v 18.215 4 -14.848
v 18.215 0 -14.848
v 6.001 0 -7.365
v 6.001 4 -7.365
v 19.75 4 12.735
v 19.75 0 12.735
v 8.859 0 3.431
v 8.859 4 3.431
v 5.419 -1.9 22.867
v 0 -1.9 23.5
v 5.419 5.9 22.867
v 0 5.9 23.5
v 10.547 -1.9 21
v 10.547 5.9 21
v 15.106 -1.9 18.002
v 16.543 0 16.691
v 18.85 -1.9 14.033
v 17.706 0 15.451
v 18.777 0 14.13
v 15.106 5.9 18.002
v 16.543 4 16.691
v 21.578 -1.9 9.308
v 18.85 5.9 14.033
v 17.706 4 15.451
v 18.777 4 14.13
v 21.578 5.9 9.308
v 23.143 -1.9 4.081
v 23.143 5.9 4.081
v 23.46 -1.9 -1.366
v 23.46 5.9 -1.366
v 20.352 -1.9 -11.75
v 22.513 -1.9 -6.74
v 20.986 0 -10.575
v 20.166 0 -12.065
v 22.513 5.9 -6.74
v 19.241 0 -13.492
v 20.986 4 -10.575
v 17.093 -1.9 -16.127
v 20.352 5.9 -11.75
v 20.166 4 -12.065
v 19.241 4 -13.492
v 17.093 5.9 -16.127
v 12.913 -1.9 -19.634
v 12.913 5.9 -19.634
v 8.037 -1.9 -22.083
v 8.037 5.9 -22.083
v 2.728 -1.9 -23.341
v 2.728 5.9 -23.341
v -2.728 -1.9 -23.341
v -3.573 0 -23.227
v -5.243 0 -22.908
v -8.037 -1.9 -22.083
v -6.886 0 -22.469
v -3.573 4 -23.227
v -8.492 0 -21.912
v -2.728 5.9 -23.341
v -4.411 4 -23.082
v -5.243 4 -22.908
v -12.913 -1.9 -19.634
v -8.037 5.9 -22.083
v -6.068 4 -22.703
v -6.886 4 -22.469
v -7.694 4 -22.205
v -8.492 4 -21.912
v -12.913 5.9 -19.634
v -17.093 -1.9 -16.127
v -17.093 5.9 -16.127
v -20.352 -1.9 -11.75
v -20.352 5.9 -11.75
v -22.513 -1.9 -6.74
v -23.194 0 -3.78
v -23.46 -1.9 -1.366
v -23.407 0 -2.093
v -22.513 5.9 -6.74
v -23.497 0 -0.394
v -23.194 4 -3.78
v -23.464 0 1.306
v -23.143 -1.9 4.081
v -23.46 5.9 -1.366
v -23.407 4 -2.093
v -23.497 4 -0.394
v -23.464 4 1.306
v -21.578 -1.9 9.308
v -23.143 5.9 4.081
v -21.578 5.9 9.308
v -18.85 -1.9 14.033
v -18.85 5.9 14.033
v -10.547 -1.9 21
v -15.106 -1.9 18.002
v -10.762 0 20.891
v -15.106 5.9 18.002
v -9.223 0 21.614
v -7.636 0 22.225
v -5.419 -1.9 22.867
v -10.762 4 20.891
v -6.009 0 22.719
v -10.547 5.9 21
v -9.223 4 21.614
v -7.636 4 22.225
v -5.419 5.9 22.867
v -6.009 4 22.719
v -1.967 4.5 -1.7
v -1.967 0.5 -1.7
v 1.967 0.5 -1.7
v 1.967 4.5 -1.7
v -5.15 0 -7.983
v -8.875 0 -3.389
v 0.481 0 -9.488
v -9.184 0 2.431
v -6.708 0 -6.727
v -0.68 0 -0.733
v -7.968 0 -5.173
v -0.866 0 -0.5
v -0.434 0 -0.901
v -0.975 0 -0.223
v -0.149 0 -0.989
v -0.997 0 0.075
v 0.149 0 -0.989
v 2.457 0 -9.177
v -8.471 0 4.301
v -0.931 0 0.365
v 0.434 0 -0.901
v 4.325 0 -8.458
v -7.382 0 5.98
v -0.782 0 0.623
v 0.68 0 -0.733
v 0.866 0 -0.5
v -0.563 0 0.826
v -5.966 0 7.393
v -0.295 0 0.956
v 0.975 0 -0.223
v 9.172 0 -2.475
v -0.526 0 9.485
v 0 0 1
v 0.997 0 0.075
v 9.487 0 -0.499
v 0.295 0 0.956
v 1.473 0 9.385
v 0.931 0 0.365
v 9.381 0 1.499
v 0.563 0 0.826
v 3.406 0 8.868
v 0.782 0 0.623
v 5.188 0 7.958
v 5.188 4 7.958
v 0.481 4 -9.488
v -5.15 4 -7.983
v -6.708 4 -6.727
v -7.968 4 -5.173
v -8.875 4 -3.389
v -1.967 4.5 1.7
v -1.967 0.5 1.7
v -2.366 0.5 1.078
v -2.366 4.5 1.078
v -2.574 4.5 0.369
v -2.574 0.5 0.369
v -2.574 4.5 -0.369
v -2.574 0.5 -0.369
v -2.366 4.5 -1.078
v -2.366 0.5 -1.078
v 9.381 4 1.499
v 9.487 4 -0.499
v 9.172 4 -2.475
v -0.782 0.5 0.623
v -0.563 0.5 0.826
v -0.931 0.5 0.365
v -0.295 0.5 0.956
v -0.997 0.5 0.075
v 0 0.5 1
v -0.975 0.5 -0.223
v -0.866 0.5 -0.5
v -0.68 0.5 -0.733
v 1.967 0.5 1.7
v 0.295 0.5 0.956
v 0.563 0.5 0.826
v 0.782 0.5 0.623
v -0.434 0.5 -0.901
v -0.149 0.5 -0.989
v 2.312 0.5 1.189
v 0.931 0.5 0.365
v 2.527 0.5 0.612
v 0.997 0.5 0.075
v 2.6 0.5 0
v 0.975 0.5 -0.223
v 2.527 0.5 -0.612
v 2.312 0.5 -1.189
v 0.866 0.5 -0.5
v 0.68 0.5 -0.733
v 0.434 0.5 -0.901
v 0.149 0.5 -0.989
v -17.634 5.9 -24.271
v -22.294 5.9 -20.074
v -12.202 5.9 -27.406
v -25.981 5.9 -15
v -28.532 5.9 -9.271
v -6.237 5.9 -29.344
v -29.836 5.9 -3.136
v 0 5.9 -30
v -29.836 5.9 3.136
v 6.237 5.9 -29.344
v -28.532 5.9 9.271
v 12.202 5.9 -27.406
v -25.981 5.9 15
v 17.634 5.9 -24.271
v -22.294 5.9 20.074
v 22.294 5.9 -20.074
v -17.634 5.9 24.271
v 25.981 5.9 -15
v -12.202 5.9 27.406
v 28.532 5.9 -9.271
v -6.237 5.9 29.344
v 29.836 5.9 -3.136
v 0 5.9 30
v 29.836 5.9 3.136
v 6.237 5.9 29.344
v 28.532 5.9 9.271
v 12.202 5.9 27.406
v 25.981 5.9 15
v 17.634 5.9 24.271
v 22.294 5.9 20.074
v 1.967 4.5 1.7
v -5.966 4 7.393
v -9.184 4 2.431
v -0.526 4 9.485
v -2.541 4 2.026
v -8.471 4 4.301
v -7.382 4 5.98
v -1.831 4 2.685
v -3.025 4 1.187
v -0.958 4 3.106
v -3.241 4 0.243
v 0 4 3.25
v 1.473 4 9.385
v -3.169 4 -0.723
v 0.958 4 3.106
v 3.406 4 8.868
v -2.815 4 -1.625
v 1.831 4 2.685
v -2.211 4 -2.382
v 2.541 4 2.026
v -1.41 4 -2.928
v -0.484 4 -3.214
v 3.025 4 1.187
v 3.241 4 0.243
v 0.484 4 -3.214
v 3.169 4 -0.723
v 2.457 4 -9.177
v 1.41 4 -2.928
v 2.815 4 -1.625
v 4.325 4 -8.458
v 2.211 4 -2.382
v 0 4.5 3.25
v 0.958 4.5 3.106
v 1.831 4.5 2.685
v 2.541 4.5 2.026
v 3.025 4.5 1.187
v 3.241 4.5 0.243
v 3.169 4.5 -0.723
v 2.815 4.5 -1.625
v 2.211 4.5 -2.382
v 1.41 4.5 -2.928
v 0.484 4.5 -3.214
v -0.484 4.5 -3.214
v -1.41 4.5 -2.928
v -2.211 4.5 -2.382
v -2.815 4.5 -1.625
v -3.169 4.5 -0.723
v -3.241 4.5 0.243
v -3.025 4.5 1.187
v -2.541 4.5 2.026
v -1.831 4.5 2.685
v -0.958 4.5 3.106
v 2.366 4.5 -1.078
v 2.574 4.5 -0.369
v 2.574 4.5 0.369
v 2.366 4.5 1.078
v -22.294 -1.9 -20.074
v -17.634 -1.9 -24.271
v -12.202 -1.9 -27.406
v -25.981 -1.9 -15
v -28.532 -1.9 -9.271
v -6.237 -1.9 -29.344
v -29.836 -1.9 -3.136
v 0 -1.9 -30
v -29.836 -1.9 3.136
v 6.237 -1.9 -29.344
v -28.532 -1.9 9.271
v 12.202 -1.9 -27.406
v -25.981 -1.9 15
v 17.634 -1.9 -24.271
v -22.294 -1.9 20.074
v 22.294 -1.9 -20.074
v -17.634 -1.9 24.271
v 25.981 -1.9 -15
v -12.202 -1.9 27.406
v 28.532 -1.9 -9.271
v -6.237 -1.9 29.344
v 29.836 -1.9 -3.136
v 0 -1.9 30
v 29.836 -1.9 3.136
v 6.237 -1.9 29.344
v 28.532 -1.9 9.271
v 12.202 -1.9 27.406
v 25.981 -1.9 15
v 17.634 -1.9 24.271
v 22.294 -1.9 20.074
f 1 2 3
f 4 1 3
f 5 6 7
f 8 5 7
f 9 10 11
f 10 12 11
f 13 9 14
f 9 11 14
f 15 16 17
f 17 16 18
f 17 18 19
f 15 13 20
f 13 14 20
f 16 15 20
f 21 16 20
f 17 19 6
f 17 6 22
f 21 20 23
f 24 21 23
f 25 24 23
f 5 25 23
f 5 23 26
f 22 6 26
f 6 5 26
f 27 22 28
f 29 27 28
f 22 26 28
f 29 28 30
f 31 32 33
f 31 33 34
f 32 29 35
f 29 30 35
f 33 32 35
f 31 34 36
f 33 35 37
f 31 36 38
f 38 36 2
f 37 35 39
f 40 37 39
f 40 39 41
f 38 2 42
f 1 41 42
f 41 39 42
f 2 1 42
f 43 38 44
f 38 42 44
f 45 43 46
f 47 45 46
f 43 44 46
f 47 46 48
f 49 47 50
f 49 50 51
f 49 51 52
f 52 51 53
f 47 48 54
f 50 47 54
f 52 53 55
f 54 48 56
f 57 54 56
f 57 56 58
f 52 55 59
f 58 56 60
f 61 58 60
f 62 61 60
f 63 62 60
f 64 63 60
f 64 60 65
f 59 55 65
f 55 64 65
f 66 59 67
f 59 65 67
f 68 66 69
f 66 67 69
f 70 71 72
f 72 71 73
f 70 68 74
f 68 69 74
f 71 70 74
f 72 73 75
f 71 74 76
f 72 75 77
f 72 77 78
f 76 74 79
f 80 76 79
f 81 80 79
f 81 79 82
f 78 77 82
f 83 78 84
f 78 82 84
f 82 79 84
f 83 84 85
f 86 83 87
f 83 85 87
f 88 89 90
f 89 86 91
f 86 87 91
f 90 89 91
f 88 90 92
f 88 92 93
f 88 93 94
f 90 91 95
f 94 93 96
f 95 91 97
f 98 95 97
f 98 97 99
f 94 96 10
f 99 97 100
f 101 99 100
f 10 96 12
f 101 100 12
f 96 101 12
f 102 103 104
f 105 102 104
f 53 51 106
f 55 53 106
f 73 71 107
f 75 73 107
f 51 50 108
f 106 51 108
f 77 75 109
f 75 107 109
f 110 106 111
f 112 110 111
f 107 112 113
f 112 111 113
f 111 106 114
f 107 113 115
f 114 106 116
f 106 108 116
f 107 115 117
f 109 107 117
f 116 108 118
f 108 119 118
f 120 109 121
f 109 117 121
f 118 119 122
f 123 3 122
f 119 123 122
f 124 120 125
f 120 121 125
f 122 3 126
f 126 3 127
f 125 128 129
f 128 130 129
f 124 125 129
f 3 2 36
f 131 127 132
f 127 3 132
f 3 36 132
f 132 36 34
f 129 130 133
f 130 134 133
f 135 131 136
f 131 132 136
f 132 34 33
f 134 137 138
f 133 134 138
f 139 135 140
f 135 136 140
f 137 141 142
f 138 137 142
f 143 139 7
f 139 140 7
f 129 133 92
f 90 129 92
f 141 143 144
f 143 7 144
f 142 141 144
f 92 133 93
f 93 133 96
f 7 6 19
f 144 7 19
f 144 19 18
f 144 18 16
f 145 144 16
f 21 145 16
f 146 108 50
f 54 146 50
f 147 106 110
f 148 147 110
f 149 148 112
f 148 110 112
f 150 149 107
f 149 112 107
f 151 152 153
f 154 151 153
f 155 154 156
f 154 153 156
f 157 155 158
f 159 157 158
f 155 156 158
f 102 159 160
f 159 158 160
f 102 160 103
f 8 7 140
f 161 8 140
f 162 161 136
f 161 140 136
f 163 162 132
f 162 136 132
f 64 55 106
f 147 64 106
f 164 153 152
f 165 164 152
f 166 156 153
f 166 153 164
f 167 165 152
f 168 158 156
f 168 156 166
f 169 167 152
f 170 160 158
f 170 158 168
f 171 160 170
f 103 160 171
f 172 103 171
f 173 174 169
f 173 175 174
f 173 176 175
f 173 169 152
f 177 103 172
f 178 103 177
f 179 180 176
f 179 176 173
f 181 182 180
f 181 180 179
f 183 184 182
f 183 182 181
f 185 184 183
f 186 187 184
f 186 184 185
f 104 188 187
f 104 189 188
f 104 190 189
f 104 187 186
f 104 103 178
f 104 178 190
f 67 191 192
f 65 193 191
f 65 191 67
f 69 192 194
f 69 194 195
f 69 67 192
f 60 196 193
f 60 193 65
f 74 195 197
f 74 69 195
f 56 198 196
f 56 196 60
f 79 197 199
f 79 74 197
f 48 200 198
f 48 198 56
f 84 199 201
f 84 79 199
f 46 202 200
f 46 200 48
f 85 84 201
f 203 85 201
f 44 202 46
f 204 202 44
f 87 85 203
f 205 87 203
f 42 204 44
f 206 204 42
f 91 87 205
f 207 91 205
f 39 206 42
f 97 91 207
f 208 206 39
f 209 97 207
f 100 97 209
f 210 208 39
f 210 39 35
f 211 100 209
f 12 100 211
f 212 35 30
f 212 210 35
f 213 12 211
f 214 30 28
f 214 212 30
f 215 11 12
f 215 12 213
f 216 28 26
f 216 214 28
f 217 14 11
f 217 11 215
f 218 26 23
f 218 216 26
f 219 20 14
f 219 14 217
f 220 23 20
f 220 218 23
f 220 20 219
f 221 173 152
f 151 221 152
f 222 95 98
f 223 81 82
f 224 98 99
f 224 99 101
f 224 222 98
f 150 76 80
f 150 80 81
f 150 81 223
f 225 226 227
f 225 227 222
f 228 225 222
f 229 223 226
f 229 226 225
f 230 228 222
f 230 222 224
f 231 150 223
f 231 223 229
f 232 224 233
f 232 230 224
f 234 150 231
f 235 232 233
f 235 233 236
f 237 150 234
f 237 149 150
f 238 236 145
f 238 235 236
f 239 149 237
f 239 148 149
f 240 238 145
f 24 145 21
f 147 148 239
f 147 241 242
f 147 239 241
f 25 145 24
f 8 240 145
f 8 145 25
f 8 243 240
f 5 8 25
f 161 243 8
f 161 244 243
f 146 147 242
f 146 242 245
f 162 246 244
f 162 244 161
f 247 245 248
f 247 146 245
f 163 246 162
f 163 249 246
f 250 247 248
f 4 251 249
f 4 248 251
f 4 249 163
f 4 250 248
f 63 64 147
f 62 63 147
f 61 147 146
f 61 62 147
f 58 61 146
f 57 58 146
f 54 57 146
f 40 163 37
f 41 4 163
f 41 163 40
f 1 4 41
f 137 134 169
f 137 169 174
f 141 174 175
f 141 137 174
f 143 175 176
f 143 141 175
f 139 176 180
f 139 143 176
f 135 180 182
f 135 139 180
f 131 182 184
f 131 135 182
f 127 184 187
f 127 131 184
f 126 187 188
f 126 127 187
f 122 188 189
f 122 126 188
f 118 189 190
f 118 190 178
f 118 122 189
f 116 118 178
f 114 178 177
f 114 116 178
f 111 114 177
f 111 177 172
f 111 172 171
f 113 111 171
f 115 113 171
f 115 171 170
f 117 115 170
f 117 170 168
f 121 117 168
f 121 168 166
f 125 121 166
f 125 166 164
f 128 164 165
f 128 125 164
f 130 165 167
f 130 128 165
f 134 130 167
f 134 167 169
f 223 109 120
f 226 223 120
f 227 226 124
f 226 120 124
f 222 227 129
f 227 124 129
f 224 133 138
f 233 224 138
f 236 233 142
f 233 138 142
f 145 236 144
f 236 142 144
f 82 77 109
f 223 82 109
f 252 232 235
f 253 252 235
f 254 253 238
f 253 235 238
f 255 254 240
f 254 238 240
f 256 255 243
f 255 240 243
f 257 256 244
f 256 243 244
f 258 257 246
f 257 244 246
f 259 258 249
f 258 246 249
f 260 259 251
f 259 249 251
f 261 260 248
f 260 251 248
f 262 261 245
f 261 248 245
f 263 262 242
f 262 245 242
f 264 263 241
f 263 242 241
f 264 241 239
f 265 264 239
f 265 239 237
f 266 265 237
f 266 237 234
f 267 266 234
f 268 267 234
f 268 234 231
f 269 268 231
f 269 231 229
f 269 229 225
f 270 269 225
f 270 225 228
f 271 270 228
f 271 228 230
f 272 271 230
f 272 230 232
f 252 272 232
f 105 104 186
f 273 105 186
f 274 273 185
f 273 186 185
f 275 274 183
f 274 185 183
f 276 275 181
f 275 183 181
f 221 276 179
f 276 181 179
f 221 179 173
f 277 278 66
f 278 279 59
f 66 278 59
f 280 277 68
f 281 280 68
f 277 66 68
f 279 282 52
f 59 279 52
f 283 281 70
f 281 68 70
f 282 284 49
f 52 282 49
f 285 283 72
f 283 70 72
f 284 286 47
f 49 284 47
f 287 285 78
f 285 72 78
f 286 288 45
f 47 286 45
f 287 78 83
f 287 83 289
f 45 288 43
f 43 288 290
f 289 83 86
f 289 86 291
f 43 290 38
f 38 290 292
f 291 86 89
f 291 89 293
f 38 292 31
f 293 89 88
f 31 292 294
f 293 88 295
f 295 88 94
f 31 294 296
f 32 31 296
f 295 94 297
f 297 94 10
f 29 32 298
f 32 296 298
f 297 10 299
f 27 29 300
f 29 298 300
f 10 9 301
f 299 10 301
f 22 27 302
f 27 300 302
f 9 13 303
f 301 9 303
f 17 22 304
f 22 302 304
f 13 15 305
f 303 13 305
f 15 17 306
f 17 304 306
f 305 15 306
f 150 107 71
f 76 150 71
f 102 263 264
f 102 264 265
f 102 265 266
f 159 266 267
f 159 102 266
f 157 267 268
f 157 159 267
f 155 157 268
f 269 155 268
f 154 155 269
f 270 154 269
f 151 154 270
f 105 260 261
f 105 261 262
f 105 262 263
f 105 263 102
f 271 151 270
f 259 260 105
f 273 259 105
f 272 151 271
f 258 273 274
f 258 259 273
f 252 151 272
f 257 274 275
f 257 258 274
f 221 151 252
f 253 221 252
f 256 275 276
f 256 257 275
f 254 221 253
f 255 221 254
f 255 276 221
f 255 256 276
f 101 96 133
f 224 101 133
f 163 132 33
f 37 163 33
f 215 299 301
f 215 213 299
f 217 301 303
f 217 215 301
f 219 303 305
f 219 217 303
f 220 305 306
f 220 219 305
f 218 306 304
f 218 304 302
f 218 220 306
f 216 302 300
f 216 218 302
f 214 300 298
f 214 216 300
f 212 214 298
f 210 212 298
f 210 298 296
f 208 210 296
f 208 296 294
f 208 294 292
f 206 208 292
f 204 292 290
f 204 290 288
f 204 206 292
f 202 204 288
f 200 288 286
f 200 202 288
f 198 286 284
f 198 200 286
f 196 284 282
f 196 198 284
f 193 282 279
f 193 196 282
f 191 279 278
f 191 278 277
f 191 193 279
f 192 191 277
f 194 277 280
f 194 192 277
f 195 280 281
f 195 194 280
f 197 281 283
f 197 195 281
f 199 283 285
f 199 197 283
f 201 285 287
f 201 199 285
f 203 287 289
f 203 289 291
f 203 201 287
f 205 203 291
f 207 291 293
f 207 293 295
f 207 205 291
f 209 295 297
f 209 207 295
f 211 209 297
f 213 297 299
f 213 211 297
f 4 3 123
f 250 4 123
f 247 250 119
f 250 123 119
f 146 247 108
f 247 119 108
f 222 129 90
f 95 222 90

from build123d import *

# Parameters (mm, degrees)
SKETCH1_R                = 3.25
BOSS_EXTRUDE1_DEPTH      = 4
SKETCH1_4_R              = 3.25
BOSS_EXTRUDE2_DEPTH      = 4.5
SKETCH1_5_R              = 1
BOSS_EXTRUDE3_DEPTH      = 0.5
BOSS_EXTRUDE4_DEPTH      = 5.9
BOSS_EXTRUDE4_DEPTH_BACK = 1.9
SKETCH1_6_R              = 30


with BuildPart() as part:
    # Sketch1 → Boss-Extrude1 (new body)
    with BuildSketch(Plane(origin=(0, 0, 0), x_dir=(1, 0, 0), z_dir=(0, 1, 0))):
        with BuildLine():
            Line((-8.492467394, 21.911823237), (-5.150259407, 7.982783226))
            ThreePointArc((-5.150259407, 7.982783226), (-7.379213612, 5.983076673), (-8.874983612, 3.388903346))
            Line((-8.874983612, 3.388903346), (-23.194055647, 3.779653774))
            ThreePointArc((-23.194055647, 3.779653774), (-23.46703432, 1.244307122), (-23.463699022, -1.305690697))
            Line((-23.463699022, -1.305690697), (-9.183595688, -2.431372091))
            ThreePointArc((-9.183595688, -2.431372091), (-7.970546468, -5.16917682), (-5.965559371, -7.39338227))
            Line((-5.965559371, -7.39338227), (-10.762021714, -20.890880513))
            ThreePointArc((-10.762021714, -20.890880513), (-8.435118809, -21.933963861), (-6.008896103, -22.718784466))
            Line((-6.008896103, -22.718784466), (-0.525514867, -9.485453818))
            ThreePointArc((-0.525514867, -9.485453818), (2.453144985, -9.177803642), (5.188065158, -7.958264881))
            Line((5.188065158, -7.958264881), (16.54276044, -16.690927986))
            ThreePointArc((16.54276044, -16.690927986), (18.253844197, -14.800242296), (19.749996995, -12.735290287))
            Line((19.749996995, -12.735290287), (8.858809639, -3.430960767))
            ThreePointArc((8.858809639, -3.430960767), (9.486673449, -0.503017773), (9.171959975, 2.474904082))
            Line((9.171959975, 2.474904082), (20.986009934, 10.575319714))
            ThreePointArc((20.986009934, 10.575319714), (19.716614948, 12.78691108), (18.215065524, 14.847942212))
            Line((18.215065524, 14.847942212), (6.000560323, 7.365003449))
            ThreePointArc((6.000560323, 7.365003449), (3.409941646, 8.866921561), (0.48051785, 9.487839722))
            Line((0.48051785, 9.487839722), (-3.572693012, 23.226835011))
            ThreePointArc((-3.572693012, 23.226835011), (-6.068306016, 22.702987955), (-8.492467394, 21.911823237))
        make_face()
        Circle(SKETCH1_R, mode=Mode.SUBTRACT)
    extrude(amount=BOSS_EXTRUDE1_DEPTH)

    # Sketch1<4> → Boss-Extrude2 (add)
    with BuildSketch(Plane(origin=(0, 0, 0), x_dir=(1, 0, 0), z_dir=(0, 1, 0))):
        Circle(SKETCH1_4_R)
        with BuildLine():
            Line((-1.967231557, 1.7), (1.967231557, 1.7))
            ThreePointArc((1.967231557, 1.7), (2.6, 0), (1.967231557, -1.7))
            Line((1.967231557, -1.7), (-1.967231557, -1.7))
            ThreePointArc((-1.967231557, -1.7), (-2.6, 0), (-1.967231557, 1.7))
        make_face(mode=Mode.SUBTRACT)
    extrude(amount=BOSS_EXTRUDE2_DEPTH)

    # Sketch1<5> → Boss-Extrude3 (add)
    with BuildSketch(Plane(origin=(0, 0, 0), x_dir=(1, 0, 0), z_dir=(0, 1, 0))):
        with BuildLine():
            Line((1.967231557, 1.7), (-1.967231557, 1.7))
            ThreePointArc((-1.967231557, 1.7), (-2.6, 0), (-1.967231557, -1.7))
            Line((-1.967231557, -1.7), (1.967231557, -1.7))
            ThreePointArc((1.967231557, -1.7), (2.6, 0), (1.967231557, 1.7))
        make_face()
        Circle(SKETCH1_5_R, mode=Mode.SUBTRACT)
    extrude(amount=BOSS_EXTRUDE3_DEPTH)

    # Sketch1<6> → Boss-Extrude4 (add, two sides: drawn at the far end of the back side and taken through both)
    with BuildSketch(Plane(origin=(0, 0, 0), x_dir=(1, 0, 0), z_dir=(0, 1, 0)).offset(-BOSS_EXTRUDE4_DEPTH_BACK)):
        Circle(SKETCH1_6_R)
        with BuildLine():
            ThreePointArc((-8.492467394, 21.911823237), (-7.291125837, 22.340310741), (-6.068306016, 22.702987955))
            ThreePointArc((-6.068306016, 22.702987955), (-4.827610123, 22.998786501), (-3.572693012, 23.226835011))
            ThreePointArc((-3.572693012, 23.226835011), (8.435118809, 21.933963861), (18.215065524, 14.847942212))
            ThreePointArc((18.215065524, 14.847942212), (19.716614948, 12.78691108), (20.986009934, 10.575319714))
            ThreePointArc((20.986009934, 10.575319714), (22.862865453, 5.435014561), (23.5, 0))
            ThreePointArc((23.5, 0), (22.543013656, -6.637961683), (19.749996995, -12.735290287))
            ThreePointArc((19.749996995, -12.735290287), (18.253844197, -14.800242296), (16.54276044, -16.690927986))
            ThreePointArc((16.54276044, -16.690927986), (6.068306016, -22.702987955), (-6.008896103, -22.718784466))
            ThreePointArc((-6.008896103, -22.718784466), (-8.435118809, -21.933963861), (-10.762021714, -20.890880513))
            ThreePointArc((-10.762021714, -20.890880513), (-19.716614948, -12.78691108), (-23.463699022, -1.305690697))
            ThreePointArc((-23.463699022, -1.305690697), (-23.46703432, 1.244307122), (-23.194055647, 3.779653774))
            ThreePointArc((-23.194055647, 3.779653774), (-18.253844197, 14.800242296), (-8.492467394, 21.911823237))
        make_face(mode=Mode.SUBTRACT)
    extrude(amount=BOSS_EXTRUDE4_DEPTH + BOSS_EXTRUDE4_DEPTH_BACK)


solid = part.part
